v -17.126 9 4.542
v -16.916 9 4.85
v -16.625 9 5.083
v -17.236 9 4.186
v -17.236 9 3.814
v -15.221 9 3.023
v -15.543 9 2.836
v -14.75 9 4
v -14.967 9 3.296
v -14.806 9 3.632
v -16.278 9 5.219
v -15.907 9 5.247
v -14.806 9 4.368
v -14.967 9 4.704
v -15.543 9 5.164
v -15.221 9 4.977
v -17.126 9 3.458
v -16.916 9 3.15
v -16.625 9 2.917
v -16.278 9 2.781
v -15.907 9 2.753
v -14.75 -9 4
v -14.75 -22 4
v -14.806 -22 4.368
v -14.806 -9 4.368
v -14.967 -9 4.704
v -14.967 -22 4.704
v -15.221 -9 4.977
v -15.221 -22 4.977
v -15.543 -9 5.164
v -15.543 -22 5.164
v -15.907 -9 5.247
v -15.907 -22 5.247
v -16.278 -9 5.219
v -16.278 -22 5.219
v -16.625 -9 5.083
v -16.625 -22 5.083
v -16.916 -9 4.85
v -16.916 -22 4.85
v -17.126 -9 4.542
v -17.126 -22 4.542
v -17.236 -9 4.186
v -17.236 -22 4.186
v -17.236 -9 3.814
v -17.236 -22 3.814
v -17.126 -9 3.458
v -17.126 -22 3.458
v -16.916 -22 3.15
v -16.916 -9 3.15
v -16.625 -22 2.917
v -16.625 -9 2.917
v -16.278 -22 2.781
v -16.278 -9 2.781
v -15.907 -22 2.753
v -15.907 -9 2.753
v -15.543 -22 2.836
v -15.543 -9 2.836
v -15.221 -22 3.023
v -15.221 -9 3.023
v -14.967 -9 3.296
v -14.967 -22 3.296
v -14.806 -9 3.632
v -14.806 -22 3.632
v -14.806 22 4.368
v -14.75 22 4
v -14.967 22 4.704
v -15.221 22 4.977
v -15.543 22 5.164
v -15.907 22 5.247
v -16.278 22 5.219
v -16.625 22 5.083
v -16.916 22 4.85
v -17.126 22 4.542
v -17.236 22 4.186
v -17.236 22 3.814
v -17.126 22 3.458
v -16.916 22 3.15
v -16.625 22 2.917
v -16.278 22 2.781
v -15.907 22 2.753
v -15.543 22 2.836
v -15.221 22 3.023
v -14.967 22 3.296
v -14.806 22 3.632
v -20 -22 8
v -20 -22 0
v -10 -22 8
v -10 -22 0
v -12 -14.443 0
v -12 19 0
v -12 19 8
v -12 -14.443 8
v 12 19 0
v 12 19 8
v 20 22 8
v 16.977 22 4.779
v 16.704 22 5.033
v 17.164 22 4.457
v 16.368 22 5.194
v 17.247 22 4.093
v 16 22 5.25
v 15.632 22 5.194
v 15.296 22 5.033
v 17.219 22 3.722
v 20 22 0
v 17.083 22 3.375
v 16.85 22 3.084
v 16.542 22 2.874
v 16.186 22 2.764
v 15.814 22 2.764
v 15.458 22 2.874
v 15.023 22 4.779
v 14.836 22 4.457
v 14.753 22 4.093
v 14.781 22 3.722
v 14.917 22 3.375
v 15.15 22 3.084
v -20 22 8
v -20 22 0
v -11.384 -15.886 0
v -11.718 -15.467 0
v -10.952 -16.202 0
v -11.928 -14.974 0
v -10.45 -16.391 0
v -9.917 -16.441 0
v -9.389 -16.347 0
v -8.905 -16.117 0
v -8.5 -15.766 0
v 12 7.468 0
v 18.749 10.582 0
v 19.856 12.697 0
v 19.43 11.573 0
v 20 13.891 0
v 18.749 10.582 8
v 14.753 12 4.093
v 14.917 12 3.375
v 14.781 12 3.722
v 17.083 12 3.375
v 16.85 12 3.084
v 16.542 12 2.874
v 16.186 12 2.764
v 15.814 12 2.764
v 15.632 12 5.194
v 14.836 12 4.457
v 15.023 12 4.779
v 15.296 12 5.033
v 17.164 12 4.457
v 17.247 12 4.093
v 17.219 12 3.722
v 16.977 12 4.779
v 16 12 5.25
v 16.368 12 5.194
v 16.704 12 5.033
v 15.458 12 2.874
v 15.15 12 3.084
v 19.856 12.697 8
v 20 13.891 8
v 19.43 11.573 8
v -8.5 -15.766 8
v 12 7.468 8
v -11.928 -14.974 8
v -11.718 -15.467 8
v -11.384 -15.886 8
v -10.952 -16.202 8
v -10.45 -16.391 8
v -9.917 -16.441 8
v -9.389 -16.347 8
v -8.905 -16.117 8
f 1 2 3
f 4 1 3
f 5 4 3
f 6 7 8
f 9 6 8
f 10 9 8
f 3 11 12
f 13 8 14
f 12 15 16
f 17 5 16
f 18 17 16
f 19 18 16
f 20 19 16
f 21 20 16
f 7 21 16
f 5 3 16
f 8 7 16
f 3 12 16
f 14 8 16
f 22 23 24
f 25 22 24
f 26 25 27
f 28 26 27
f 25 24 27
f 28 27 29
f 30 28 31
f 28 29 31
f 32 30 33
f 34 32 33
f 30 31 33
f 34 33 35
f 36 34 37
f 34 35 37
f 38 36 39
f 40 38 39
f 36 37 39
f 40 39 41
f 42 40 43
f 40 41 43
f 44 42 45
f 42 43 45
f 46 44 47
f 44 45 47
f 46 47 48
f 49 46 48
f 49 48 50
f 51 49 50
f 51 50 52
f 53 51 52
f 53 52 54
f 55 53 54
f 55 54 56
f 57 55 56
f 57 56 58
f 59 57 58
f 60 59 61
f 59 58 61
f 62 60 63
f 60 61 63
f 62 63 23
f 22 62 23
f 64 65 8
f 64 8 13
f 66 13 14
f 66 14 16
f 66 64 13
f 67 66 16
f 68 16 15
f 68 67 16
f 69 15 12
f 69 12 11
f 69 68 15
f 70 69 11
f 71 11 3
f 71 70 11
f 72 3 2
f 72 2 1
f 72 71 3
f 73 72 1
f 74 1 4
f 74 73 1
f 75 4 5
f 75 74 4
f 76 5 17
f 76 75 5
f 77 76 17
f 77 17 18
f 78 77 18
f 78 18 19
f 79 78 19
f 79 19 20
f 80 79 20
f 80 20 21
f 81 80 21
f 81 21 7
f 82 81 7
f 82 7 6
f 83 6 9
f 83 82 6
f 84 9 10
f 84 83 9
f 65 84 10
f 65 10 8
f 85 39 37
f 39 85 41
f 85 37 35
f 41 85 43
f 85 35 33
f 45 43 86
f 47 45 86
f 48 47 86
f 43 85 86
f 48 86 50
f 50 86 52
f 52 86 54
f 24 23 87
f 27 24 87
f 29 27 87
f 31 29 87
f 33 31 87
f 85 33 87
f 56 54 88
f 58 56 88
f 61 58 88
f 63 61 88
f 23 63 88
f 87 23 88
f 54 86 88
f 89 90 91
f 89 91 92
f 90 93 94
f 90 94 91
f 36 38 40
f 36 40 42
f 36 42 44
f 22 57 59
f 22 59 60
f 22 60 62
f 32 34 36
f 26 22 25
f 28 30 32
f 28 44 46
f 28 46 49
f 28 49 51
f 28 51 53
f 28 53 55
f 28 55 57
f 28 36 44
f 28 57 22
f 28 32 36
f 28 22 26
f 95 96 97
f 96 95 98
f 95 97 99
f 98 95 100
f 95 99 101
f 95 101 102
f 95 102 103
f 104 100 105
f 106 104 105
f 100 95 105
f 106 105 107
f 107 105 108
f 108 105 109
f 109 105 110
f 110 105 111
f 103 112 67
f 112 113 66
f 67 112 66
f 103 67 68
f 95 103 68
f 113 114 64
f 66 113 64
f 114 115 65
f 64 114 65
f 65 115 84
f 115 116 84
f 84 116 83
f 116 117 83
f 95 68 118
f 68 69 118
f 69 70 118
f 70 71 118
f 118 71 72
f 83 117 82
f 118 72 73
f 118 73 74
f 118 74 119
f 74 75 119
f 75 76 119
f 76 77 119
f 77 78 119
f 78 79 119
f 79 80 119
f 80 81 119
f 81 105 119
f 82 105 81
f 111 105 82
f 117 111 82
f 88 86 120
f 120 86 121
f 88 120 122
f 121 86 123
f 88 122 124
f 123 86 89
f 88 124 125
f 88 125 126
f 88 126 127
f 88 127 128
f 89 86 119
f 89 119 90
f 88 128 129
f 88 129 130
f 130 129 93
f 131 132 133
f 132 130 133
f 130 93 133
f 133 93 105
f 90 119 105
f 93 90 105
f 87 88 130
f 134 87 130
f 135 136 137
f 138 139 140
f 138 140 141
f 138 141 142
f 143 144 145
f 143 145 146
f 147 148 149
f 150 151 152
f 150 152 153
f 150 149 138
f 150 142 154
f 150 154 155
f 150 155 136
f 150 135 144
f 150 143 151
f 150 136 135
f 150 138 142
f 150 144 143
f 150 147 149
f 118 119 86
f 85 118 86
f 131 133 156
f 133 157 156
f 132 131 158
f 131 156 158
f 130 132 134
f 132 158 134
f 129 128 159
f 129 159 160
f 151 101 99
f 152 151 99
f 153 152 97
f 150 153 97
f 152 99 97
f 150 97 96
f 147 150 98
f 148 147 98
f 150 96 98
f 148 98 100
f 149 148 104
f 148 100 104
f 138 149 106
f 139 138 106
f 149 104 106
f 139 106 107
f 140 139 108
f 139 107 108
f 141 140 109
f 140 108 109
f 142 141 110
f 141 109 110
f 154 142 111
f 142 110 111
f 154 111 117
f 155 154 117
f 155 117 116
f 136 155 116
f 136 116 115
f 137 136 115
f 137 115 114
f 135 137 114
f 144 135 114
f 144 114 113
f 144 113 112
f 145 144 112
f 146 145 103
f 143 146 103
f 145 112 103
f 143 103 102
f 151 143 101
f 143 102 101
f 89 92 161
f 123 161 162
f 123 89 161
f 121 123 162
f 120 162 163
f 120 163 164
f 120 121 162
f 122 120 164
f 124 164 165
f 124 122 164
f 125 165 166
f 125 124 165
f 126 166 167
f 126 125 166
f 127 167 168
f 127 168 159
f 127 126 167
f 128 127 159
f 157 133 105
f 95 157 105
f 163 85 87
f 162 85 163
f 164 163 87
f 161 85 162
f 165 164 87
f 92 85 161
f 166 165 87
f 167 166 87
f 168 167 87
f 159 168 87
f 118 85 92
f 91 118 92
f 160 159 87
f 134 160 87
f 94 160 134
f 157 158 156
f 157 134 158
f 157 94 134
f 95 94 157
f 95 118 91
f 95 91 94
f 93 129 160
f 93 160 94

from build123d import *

# Parameters (mm, degrees)
EXTRUDE_958_DEPTH      = 8
SKETCH_5_R             = 1.25
CUT_EXTRUDE_1488_DEPTH = 13
SKETCH_6_R             = 1.25
CUT_EXTRUDE_1665_DEPTH = 10
FILLET_2_R             = 5


with BuildPart() as part:
    # Эскиз1 → Extrude 958 (new body)
    with BuildSketch(Plane.XY):
        Polygon((-20, 22), (-20, -22), (-10, -22), (20, 12), (20, 22), align=None)
        with BuildLine():
            Line((-12, 19), (-12, -14.442810634))
            ThreePointArc((-12, -14.442810634), (-10.707336051, -16.313552656), (-8.500324289, -15.766053908))
            Line((-8.500324289, -15.766053908), (12, 7.467646953))
            Line((12, 7.467646953), (12, 19))
            Line((12, 19), (-12, 19))
        make_face(mode=Mode.SUBTRACT)
    extrude(amount=EXTRUDE_958_DEPTH)

    # Эскиз5 → Cut-Extrude 1488 (cut)
    with BuildSketch(Plane.XZ.offset(22)):
        with Locations((-16, 4)):
            Circle(SKETCH_5_R)
    cut_extrude_1488 = extrude(amount=-CUT_EXTRUDE_1488_DEPTH, mode=Mode.SUBTRACT)

    # Эскиз6 → Cut-Extrude 1665 (cut)
    with BuildSketch(Plane(origin=(0, 22, 0), x_dir=(1, 0, 0), z_dir=(0, 1, 0))):
        with Locations(Location((16, -4, 0), (0, 0, 270))):
            Circle(SKETCH_6_R)
    extrude(amount=-CUT_EXTRUDE_1665_DEPTH, mode=Mode.SUBTRACT)

    # Скругление2
    fillet_2_edges = [part.edges().sort_by_distance(p)[0] for p in [
        (20, 12, 4),
    ]]
    fillet(fillet_2_edges, radius=FILLET_2_R)

    # Зеркальное отражение1: Cut-Extrude 1488 across plane
    add(cut_extrude_1488.mirror(Plane.ZX), mode=Mode.SUBTRACT)


solid = part.part
